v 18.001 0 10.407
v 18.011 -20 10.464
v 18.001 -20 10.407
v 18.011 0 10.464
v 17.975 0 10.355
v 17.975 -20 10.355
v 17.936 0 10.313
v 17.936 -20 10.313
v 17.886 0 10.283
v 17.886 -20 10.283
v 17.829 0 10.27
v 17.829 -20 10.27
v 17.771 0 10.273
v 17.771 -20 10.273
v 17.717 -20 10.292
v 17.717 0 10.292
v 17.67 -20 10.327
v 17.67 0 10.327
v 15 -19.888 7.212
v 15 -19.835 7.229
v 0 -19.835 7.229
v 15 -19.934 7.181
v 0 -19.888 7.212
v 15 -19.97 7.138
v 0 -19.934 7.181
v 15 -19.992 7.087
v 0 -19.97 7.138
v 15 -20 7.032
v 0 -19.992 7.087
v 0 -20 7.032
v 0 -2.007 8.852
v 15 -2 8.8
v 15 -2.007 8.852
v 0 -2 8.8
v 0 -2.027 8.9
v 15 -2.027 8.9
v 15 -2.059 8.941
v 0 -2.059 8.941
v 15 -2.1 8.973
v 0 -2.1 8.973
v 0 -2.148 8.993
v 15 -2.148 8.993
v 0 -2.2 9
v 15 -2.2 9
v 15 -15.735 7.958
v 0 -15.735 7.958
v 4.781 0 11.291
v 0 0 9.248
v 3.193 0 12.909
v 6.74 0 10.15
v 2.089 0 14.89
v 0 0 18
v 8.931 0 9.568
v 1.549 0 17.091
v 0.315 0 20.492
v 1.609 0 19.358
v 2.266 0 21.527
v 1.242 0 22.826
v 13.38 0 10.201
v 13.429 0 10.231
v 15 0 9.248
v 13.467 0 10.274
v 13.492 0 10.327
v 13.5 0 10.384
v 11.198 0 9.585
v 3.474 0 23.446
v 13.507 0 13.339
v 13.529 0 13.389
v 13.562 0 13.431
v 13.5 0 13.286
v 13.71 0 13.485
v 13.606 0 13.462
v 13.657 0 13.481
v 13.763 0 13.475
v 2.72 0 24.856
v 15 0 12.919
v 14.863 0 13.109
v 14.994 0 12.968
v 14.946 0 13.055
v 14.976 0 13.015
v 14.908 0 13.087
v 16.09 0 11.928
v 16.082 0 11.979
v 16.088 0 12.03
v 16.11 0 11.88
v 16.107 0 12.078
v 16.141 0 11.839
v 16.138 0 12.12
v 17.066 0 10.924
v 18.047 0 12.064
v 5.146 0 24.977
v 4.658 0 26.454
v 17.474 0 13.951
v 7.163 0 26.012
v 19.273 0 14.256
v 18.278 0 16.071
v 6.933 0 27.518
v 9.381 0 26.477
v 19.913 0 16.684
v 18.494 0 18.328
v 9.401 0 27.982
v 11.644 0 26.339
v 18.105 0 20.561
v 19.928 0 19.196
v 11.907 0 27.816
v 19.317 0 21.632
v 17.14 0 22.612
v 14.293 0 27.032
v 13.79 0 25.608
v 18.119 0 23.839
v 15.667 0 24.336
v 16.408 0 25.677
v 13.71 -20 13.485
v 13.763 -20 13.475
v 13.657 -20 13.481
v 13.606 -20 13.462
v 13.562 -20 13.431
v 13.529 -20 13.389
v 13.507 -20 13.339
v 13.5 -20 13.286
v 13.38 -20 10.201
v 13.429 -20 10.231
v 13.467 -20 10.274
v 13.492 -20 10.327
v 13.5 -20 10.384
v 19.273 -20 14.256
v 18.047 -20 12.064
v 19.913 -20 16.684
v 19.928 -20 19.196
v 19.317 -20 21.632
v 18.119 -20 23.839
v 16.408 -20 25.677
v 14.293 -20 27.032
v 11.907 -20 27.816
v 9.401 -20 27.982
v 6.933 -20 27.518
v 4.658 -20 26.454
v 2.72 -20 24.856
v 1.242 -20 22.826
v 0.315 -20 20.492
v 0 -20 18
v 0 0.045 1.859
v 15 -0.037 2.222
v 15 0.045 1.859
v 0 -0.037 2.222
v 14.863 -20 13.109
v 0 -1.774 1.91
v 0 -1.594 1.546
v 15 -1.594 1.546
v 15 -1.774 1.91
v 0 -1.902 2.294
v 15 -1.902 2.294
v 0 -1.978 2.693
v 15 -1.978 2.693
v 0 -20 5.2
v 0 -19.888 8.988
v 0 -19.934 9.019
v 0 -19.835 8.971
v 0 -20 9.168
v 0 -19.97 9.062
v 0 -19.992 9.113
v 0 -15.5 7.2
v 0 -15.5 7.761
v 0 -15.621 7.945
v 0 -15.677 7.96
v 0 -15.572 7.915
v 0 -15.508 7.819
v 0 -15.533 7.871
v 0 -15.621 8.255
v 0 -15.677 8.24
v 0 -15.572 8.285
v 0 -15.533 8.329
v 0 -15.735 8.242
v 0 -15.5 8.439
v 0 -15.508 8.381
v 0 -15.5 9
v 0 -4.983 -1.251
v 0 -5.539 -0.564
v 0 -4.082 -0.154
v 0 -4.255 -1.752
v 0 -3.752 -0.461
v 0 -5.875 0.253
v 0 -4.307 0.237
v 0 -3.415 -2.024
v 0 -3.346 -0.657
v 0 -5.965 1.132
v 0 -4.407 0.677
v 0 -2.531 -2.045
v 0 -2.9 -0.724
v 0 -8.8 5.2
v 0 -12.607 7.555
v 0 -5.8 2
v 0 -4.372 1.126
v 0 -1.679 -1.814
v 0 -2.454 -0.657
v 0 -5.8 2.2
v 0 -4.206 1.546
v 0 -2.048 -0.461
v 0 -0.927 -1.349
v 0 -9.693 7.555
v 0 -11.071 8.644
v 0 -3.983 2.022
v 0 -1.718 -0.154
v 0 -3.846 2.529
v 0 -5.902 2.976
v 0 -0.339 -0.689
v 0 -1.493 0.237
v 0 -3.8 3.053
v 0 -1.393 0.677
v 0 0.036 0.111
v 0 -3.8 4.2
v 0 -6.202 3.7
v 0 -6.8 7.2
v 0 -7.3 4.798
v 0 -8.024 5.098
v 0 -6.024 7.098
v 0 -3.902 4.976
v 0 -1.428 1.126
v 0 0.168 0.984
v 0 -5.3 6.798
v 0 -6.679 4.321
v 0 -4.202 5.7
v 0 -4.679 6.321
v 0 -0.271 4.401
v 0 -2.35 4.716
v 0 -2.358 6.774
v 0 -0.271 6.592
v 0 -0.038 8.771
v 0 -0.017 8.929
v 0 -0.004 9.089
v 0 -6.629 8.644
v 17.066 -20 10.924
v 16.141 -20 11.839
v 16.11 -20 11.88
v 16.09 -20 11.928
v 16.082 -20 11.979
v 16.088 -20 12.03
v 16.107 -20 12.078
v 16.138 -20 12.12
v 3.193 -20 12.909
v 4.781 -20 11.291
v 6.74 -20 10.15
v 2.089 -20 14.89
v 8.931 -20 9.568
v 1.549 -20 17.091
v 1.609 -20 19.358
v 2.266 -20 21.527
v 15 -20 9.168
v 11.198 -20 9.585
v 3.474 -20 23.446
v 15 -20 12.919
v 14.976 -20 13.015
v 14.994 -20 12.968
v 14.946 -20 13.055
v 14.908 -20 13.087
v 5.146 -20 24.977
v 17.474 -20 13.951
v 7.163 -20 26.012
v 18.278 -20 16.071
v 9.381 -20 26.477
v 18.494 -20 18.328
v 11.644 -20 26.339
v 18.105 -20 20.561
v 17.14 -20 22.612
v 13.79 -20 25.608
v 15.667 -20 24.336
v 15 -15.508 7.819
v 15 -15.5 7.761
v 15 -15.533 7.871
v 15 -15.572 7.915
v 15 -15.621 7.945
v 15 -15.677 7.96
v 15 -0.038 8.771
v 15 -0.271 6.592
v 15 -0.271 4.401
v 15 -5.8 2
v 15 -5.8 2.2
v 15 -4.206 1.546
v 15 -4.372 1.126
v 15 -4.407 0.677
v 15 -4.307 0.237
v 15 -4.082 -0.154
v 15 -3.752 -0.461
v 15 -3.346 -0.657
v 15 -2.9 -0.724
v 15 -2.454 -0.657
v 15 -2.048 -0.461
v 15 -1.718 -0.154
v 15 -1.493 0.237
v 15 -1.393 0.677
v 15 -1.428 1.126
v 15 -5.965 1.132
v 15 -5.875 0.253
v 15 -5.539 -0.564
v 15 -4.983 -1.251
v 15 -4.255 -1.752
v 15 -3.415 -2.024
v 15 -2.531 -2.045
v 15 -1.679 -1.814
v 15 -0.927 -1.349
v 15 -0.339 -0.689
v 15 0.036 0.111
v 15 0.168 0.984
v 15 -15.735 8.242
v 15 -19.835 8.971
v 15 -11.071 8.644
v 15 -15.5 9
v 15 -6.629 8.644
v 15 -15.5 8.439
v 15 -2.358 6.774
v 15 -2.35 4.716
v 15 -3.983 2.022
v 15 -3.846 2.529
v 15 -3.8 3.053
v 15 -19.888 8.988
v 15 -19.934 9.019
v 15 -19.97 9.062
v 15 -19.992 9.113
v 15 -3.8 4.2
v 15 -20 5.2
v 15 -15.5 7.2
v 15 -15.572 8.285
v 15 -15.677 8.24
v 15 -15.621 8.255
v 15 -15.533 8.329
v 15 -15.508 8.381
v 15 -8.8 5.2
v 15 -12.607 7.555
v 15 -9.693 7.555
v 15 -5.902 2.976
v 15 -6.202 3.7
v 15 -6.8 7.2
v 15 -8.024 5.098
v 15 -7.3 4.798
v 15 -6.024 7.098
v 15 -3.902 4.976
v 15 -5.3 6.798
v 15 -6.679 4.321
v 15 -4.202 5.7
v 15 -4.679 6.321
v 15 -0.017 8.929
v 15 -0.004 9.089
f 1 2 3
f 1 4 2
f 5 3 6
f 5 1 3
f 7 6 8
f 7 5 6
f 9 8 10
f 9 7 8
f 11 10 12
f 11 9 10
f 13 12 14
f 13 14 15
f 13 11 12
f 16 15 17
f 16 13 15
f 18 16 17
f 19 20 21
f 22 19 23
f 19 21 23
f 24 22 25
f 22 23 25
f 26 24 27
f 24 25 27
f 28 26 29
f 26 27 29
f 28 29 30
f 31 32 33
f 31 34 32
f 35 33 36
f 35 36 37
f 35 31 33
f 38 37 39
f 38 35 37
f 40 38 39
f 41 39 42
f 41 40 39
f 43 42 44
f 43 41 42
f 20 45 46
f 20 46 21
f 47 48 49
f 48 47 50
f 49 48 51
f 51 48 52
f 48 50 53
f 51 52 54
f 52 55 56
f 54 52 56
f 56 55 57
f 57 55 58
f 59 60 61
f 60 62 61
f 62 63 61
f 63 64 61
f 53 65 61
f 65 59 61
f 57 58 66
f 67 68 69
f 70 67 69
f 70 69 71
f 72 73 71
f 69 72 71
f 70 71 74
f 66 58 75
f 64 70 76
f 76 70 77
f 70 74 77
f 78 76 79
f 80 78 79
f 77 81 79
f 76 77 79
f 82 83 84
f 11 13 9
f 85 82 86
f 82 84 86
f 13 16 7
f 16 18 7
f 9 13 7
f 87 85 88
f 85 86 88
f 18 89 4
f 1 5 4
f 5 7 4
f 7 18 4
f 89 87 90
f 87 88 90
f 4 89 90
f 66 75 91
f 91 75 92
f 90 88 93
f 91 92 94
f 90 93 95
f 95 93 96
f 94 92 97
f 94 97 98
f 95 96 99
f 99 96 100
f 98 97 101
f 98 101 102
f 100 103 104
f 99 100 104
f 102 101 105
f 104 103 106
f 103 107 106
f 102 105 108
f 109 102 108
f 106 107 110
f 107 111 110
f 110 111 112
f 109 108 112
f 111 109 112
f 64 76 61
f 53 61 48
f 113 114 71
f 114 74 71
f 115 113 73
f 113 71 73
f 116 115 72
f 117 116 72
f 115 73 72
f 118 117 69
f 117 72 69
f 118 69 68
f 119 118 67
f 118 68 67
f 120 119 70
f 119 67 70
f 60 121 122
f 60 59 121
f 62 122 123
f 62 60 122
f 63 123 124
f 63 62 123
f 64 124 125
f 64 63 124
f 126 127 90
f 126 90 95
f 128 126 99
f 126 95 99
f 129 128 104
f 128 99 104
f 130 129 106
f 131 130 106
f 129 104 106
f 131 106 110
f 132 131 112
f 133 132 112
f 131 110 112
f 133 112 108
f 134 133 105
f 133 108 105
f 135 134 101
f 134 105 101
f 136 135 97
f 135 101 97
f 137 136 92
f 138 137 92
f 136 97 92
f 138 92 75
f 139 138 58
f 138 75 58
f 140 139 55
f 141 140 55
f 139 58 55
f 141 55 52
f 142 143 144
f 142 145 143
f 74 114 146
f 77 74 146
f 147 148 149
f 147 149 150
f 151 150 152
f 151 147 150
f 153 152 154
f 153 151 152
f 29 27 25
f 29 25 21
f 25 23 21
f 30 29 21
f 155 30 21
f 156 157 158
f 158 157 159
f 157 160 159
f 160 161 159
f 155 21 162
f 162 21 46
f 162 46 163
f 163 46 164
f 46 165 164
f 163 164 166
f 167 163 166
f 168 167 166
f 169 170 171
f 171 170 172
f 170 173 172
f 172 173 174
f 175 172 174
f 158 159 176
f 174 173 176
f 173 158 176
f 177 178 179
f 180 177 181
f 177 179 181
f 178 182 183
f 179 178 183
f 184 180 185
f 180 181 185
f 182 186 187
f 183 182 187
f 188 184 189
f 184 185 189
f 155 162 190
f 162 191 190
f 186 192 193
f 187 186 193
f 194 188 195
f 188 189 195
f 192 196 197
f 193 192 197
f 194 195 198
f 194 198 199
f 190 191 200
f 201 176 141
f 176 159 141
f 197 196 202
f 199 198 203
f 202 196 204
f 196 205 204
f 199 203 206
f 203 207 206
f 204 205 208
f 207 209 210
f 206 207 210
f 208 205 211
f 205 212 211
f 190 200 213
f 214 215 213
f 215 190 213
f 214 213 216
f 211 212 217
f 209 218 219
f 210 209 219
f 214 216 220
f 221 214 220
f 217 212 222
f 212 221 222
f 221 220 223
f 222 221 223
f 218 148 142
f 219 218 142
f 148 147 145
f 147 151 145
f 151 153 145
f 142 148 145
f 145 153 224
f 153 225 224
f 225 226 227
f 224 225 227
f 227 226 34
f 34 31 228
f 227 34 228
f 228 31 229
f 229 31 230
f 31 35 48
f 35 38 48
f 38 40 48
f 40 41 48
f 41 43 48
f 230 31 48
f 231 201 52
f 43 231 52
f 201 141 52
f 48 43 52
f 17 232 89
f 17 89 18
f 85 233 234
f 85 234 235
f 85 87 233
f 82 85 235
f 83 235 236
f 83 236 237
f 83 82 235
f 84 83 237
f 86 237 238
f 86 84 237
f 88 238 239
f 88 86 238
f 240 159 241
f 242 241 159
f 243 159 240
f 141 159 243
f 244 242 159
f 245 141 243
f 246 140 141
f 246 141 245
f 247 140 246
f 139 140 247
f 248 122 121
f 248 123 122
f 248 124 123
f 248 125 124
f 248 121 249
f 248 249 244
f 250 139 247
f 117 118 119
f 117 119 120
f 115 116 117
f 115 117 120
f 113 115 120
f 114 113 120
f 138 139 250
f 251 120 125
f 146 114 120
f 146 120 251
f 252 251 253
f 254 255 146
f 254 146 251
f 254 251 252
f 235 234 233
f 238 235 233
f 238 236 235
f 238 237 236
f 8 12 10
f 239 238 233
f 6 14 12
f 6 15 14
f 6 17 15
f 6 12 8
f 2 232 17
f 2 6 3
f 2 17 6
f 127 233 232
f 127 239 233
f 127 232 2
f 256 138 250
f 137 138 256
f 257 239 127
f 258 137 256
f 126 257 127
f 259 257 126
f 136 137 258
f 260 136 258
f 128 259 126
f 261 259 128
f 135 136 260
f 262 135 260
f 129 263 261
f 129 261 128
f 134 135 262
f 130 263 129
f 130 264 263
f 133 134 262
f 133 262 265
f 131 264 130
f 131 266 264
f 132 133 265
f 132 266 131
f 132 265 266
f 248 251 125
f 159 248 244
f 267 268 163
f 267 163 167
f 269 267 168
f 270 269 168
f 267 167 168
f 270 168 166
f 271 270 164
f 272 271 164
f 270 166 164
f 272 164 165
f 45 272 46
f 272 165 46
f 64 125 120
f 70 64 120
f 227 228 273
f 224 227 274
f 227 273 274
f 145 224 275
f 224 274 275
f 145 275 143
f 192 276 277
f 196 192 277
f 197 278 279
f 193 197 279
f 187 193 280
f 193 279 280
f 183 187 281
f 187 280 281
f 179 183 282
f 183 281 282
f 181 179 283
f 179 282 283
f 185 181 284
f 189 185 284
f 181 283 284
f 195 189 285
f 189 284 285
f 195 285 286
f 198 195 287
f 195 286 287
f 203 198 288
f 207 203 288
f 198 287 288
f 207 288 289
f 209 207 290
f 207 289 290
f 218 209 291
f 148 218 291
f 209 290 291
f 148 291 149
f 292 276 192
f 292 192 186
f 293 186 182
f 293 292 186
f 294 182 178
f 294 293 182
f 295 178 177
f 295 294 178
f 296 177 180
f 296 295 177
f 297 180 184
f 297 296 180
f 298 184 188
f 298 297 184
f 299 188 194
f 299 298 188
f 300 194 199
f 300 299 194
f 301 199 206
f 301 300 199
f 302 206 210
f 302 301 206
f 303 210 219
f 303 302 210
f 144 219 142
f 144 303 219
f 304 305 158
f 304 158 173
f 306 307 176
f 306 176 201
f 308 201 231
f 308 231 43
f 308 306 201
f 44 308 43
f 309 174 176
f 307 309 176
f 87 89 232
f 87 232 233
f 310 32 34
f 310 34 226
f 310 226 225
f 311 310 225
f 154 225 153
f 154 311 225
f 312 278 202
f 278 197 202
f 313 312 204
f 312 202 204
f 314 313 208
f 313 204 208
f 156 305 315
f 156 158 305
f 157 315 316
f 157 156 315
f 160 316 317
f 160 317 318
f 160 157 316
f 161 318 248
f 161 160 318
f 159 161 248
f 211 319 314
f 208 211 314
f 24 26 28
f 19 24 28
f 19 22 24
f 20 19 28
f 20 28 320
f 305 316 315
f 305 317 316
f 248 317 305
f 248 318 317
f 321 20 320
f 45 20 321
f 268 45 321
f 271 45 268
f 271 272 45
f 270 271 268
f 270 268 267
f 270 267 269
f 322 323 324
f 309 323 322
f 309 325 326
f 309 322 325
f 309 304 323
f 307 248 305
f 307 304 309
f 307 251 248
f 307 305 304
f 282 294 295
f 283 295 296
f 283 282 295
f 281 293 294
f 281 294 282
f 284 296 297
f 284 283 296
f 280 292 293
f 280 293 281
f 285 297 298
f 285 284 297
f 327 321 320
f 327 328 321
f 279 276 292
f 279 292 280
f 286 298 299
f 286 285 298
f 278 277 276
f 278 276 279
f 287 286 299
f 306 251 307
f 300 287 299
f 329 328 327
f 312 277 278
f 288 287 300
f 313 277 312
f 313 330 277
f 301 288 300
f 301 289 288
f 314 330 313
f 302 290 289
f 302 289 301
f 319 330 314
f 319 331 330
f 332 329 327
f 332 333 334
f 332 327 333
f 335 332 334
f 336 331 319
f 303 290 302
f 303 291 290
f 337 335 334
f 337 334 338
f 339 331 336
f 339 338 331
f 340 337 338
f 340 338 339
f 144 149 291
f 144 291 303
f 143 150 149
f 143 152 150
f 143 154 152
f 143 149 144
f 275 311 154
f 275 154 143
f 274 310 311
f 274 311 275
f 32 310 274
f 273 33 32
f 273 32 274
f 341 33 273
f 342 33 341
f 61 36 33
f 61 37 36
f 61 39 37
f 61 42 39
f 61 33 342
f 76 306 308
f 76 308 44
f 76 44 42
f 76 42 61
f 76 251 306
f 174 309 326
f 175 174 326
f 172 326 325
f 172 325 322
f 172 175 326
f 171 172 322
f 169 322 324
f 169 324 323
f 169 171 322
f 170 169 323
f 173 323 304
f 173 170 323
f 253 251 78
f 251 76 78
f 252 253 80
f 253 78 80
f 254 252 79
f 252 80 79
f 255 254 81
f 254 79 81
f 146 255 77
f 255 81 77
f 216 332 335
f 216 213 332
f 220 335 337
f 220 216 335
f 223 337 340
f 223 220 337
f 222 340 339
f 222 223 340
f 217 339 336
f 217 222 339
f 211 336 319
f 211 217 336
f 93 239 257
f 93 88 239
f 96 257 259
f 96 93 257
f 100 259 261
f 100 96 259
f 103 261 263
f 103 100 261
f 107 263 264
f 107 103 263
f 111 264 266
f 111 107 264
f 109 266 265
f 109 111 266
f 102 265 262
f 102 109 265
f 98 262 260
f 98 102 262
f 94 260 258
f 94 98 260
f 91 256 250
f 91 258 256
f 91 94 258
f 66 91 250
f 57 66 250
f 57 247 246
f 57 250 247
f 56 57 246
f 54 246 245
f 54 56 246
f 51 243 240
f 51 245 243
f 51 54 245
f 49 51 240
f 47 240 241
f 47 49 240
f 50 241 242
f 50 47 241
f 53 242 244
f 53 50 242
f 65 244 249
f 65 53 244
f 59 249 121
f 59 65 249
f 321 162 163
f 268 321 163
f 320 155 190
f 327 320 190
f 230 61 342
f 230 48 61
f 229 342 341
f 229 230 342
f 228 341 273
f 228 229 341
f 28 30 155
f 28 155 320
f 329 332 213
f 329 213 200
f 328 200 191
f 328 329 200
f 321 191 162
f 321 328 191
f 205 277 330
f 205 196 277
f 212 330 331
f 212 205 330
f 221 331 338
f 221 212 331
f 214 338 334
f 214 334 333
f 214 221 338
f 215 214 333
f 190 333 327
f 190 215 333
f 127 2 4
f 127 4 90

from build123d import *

# Parameters (mm, degrees)
F0_R      = 8.5
F1_DEPTH  = 20
F2_W      = 14.2
F2_H      = 5.2
F3_DEPTH  = 15.001
F5_DEPTH  = 15
F6_W      = 1
F6_H      = 2.6394567484
F7_DEPTH  = 20.001
F8_W      = 1.5
F8_H      = 3.5
F9_DEPTH  = 20
F11_DEPTH = 20
F13_DEPTH = 15
F15_DEPTH = 15.001
F16_R     = 3
F17_R     = 0.2
F19_DEPTH = 15


with BuildPart() as f1:
    # F0 (on Front) → F1 (new body)
    with BuildSketch(Plane.XZ):
        with BuildLine():
            Line((0, 18), (0, 0))
            Line((0, 0), (15, 0))
            Line((15, 0), (15, 9.3397459622))
            ThreePointArc((15, 9.3397459622), (15, 26.6602540378), (0, 18))
        make_face()
        with Locations((10, 18)):
            Circle(F0_R, mode=Mode.SUBTRACT)
    extrude(amount=F1_DEPTH)

    # F2 (on face) → F3 (cut, through all)
    with BuildSketch(Plane.YZ.offset(15)):
        Polygon((-3.8, 2), (-2, 2), (-2, 9), (-20, 9), (-20, 7.2), (-3.8, 7.2), align=None)
        with Locations((-12.9, 2.6)):
            Rectangle(F2_W, F2_H)
    extrude(amount=-F3_DEPTH, mode=Mode.SUBTRACT)

    # F4 (on face) → F5 (join, through all)
    with BuildSketch(Plane.YZ.offset(15)):
        Polygon((-20, 7.2), (-15.5, 7.2), (-15.5, 8), align=None)
        Polygon((-15.5, 8.2), (-15.5, 9), (-20, 9), align=None)
    extrude(amount=-F5_DEPTH)

    # F6 (on face) → F7 (cut, through all)
    with BuildSketch(Plane.XZ.offset(20)):
        with Locations((15.5, 10.6594743364)):
            Rectangle(F6_W, F6_H)
    extrude(amount=-F7_DEPTH, mode=Mode.SUBTRACT)

    # F8 (on face) → F9 (join, through all)
    with BuildSketch(Plane.XZ.offset(20)):
        with Locations((14.25, 11.8130682288)):
            Rectangle(F8_W, F8_H)
        Polygon((18.0472665318, 12.0635447138), (16, 11.9792027106), (18, 10), align=None)
    extrude(amount=-F9_DEPTH)

    # F10 (on face) → F11 (cut, through all)
    with BuildSketch(Plane.XZ.offset(20)):
        Polygon((16, 11.9792027106), (16, 10), (17.0662110755, 10), (17.0662110755, 10.9240787853), align=None)
        Polygon((15, 13.5630682288), (13.5, 13.5630682288), (15, 13.0630682288), align=None)
    extrude(amount=-F11_DEPTH, mode=Mode.SUBTRACT)

    # F12 (on face) → F13 (join, through all)
    with BuildSketch(Plane.YZ.offset(15)):
        with BuildLine():
            Line((0, 2), (-5.8, 2))
            ThreePointArc((-5.8, 2), (-2.9, -2.06757233), (0, 2))
        make_face()
    extrude(amount=-F13_DEPTH)

    # F14 (on face) → F15 (cut, through all)
    with BuildSketch(Plane.YZ.offset(15)):
        with BuildLine():
            Line((-2, 2), (-3.8, 2))
            ThreePointArc((-3.8, 2), (-2.9, -0.723853077), (-2, 2))
        make_face()
        with BuildLine():
            Line((0, 2), (0, 9))
            ThreePointArc((0, 9), (-0.3, 5.5), (0, 2))
        make_face()
    extrude(amount=-F15_DEPTH, mode=Mode.SUBTRACT)

    # F16
    f16_edges = [f1.edges().sort_by_distance(p)[0] for p in [
        (7.5, -3.8, 7.2),
        (7.5, -5.8, 5.2),
        (7.5, -3.8, 2),
        (7.5, -2, 2),
        (7.5, 0, 2),
        (7.5, 0, 9),
    ]]
    fillet(f16_edges, radius=F16_R)

    # F17
    f17_edges = [f1.edges().sort_by_distance(p)[0] for p in [
        (7.5, -20, 7.2),
        (7.5, -20, 9),
        (7.5, -15.5, 8.2),
        (7.5, -15.5, 8),
        (7.5, -2, 9),
        (18, -10, 10),
        (16, -10, 11.979203),
        (13.5, -10, 13.563068),
        (15, -10, 13.063068),
        (13.5, -10, 10.254033),
    ]]
    fillet(f17_edges, radius=F17_R)

    # F18 (on face) → F19 (join, through all)
    with BuildSketch(Plane.YZ.offset(15)):
        with BuildLine():
            Line((-2.2, 9), (-15.5, 9))
            ThreePointArc((-15.5, 9), (-8.85, 8.6), (-2.2, 9))
        make_face()
        with BuildLine():
            Line((-15.5, 7.2), (-6.8, 7.2))
            ThreePointArc((-6.8, 7.2), (-11.15, 7.6), (-15.5, 7.2))
        make_face()
        with BuildLine():
            Line((-1.5938824883, 1.5457121977), (-2, 8.8))
            ThreePointArc((-2, 8.8), (-2.381934709, 5.1401063518), (-1.5938824883, 1.5457121977))
        make_face()
    extrude(amount=-F19_DEPTH)


solid = f1.part
